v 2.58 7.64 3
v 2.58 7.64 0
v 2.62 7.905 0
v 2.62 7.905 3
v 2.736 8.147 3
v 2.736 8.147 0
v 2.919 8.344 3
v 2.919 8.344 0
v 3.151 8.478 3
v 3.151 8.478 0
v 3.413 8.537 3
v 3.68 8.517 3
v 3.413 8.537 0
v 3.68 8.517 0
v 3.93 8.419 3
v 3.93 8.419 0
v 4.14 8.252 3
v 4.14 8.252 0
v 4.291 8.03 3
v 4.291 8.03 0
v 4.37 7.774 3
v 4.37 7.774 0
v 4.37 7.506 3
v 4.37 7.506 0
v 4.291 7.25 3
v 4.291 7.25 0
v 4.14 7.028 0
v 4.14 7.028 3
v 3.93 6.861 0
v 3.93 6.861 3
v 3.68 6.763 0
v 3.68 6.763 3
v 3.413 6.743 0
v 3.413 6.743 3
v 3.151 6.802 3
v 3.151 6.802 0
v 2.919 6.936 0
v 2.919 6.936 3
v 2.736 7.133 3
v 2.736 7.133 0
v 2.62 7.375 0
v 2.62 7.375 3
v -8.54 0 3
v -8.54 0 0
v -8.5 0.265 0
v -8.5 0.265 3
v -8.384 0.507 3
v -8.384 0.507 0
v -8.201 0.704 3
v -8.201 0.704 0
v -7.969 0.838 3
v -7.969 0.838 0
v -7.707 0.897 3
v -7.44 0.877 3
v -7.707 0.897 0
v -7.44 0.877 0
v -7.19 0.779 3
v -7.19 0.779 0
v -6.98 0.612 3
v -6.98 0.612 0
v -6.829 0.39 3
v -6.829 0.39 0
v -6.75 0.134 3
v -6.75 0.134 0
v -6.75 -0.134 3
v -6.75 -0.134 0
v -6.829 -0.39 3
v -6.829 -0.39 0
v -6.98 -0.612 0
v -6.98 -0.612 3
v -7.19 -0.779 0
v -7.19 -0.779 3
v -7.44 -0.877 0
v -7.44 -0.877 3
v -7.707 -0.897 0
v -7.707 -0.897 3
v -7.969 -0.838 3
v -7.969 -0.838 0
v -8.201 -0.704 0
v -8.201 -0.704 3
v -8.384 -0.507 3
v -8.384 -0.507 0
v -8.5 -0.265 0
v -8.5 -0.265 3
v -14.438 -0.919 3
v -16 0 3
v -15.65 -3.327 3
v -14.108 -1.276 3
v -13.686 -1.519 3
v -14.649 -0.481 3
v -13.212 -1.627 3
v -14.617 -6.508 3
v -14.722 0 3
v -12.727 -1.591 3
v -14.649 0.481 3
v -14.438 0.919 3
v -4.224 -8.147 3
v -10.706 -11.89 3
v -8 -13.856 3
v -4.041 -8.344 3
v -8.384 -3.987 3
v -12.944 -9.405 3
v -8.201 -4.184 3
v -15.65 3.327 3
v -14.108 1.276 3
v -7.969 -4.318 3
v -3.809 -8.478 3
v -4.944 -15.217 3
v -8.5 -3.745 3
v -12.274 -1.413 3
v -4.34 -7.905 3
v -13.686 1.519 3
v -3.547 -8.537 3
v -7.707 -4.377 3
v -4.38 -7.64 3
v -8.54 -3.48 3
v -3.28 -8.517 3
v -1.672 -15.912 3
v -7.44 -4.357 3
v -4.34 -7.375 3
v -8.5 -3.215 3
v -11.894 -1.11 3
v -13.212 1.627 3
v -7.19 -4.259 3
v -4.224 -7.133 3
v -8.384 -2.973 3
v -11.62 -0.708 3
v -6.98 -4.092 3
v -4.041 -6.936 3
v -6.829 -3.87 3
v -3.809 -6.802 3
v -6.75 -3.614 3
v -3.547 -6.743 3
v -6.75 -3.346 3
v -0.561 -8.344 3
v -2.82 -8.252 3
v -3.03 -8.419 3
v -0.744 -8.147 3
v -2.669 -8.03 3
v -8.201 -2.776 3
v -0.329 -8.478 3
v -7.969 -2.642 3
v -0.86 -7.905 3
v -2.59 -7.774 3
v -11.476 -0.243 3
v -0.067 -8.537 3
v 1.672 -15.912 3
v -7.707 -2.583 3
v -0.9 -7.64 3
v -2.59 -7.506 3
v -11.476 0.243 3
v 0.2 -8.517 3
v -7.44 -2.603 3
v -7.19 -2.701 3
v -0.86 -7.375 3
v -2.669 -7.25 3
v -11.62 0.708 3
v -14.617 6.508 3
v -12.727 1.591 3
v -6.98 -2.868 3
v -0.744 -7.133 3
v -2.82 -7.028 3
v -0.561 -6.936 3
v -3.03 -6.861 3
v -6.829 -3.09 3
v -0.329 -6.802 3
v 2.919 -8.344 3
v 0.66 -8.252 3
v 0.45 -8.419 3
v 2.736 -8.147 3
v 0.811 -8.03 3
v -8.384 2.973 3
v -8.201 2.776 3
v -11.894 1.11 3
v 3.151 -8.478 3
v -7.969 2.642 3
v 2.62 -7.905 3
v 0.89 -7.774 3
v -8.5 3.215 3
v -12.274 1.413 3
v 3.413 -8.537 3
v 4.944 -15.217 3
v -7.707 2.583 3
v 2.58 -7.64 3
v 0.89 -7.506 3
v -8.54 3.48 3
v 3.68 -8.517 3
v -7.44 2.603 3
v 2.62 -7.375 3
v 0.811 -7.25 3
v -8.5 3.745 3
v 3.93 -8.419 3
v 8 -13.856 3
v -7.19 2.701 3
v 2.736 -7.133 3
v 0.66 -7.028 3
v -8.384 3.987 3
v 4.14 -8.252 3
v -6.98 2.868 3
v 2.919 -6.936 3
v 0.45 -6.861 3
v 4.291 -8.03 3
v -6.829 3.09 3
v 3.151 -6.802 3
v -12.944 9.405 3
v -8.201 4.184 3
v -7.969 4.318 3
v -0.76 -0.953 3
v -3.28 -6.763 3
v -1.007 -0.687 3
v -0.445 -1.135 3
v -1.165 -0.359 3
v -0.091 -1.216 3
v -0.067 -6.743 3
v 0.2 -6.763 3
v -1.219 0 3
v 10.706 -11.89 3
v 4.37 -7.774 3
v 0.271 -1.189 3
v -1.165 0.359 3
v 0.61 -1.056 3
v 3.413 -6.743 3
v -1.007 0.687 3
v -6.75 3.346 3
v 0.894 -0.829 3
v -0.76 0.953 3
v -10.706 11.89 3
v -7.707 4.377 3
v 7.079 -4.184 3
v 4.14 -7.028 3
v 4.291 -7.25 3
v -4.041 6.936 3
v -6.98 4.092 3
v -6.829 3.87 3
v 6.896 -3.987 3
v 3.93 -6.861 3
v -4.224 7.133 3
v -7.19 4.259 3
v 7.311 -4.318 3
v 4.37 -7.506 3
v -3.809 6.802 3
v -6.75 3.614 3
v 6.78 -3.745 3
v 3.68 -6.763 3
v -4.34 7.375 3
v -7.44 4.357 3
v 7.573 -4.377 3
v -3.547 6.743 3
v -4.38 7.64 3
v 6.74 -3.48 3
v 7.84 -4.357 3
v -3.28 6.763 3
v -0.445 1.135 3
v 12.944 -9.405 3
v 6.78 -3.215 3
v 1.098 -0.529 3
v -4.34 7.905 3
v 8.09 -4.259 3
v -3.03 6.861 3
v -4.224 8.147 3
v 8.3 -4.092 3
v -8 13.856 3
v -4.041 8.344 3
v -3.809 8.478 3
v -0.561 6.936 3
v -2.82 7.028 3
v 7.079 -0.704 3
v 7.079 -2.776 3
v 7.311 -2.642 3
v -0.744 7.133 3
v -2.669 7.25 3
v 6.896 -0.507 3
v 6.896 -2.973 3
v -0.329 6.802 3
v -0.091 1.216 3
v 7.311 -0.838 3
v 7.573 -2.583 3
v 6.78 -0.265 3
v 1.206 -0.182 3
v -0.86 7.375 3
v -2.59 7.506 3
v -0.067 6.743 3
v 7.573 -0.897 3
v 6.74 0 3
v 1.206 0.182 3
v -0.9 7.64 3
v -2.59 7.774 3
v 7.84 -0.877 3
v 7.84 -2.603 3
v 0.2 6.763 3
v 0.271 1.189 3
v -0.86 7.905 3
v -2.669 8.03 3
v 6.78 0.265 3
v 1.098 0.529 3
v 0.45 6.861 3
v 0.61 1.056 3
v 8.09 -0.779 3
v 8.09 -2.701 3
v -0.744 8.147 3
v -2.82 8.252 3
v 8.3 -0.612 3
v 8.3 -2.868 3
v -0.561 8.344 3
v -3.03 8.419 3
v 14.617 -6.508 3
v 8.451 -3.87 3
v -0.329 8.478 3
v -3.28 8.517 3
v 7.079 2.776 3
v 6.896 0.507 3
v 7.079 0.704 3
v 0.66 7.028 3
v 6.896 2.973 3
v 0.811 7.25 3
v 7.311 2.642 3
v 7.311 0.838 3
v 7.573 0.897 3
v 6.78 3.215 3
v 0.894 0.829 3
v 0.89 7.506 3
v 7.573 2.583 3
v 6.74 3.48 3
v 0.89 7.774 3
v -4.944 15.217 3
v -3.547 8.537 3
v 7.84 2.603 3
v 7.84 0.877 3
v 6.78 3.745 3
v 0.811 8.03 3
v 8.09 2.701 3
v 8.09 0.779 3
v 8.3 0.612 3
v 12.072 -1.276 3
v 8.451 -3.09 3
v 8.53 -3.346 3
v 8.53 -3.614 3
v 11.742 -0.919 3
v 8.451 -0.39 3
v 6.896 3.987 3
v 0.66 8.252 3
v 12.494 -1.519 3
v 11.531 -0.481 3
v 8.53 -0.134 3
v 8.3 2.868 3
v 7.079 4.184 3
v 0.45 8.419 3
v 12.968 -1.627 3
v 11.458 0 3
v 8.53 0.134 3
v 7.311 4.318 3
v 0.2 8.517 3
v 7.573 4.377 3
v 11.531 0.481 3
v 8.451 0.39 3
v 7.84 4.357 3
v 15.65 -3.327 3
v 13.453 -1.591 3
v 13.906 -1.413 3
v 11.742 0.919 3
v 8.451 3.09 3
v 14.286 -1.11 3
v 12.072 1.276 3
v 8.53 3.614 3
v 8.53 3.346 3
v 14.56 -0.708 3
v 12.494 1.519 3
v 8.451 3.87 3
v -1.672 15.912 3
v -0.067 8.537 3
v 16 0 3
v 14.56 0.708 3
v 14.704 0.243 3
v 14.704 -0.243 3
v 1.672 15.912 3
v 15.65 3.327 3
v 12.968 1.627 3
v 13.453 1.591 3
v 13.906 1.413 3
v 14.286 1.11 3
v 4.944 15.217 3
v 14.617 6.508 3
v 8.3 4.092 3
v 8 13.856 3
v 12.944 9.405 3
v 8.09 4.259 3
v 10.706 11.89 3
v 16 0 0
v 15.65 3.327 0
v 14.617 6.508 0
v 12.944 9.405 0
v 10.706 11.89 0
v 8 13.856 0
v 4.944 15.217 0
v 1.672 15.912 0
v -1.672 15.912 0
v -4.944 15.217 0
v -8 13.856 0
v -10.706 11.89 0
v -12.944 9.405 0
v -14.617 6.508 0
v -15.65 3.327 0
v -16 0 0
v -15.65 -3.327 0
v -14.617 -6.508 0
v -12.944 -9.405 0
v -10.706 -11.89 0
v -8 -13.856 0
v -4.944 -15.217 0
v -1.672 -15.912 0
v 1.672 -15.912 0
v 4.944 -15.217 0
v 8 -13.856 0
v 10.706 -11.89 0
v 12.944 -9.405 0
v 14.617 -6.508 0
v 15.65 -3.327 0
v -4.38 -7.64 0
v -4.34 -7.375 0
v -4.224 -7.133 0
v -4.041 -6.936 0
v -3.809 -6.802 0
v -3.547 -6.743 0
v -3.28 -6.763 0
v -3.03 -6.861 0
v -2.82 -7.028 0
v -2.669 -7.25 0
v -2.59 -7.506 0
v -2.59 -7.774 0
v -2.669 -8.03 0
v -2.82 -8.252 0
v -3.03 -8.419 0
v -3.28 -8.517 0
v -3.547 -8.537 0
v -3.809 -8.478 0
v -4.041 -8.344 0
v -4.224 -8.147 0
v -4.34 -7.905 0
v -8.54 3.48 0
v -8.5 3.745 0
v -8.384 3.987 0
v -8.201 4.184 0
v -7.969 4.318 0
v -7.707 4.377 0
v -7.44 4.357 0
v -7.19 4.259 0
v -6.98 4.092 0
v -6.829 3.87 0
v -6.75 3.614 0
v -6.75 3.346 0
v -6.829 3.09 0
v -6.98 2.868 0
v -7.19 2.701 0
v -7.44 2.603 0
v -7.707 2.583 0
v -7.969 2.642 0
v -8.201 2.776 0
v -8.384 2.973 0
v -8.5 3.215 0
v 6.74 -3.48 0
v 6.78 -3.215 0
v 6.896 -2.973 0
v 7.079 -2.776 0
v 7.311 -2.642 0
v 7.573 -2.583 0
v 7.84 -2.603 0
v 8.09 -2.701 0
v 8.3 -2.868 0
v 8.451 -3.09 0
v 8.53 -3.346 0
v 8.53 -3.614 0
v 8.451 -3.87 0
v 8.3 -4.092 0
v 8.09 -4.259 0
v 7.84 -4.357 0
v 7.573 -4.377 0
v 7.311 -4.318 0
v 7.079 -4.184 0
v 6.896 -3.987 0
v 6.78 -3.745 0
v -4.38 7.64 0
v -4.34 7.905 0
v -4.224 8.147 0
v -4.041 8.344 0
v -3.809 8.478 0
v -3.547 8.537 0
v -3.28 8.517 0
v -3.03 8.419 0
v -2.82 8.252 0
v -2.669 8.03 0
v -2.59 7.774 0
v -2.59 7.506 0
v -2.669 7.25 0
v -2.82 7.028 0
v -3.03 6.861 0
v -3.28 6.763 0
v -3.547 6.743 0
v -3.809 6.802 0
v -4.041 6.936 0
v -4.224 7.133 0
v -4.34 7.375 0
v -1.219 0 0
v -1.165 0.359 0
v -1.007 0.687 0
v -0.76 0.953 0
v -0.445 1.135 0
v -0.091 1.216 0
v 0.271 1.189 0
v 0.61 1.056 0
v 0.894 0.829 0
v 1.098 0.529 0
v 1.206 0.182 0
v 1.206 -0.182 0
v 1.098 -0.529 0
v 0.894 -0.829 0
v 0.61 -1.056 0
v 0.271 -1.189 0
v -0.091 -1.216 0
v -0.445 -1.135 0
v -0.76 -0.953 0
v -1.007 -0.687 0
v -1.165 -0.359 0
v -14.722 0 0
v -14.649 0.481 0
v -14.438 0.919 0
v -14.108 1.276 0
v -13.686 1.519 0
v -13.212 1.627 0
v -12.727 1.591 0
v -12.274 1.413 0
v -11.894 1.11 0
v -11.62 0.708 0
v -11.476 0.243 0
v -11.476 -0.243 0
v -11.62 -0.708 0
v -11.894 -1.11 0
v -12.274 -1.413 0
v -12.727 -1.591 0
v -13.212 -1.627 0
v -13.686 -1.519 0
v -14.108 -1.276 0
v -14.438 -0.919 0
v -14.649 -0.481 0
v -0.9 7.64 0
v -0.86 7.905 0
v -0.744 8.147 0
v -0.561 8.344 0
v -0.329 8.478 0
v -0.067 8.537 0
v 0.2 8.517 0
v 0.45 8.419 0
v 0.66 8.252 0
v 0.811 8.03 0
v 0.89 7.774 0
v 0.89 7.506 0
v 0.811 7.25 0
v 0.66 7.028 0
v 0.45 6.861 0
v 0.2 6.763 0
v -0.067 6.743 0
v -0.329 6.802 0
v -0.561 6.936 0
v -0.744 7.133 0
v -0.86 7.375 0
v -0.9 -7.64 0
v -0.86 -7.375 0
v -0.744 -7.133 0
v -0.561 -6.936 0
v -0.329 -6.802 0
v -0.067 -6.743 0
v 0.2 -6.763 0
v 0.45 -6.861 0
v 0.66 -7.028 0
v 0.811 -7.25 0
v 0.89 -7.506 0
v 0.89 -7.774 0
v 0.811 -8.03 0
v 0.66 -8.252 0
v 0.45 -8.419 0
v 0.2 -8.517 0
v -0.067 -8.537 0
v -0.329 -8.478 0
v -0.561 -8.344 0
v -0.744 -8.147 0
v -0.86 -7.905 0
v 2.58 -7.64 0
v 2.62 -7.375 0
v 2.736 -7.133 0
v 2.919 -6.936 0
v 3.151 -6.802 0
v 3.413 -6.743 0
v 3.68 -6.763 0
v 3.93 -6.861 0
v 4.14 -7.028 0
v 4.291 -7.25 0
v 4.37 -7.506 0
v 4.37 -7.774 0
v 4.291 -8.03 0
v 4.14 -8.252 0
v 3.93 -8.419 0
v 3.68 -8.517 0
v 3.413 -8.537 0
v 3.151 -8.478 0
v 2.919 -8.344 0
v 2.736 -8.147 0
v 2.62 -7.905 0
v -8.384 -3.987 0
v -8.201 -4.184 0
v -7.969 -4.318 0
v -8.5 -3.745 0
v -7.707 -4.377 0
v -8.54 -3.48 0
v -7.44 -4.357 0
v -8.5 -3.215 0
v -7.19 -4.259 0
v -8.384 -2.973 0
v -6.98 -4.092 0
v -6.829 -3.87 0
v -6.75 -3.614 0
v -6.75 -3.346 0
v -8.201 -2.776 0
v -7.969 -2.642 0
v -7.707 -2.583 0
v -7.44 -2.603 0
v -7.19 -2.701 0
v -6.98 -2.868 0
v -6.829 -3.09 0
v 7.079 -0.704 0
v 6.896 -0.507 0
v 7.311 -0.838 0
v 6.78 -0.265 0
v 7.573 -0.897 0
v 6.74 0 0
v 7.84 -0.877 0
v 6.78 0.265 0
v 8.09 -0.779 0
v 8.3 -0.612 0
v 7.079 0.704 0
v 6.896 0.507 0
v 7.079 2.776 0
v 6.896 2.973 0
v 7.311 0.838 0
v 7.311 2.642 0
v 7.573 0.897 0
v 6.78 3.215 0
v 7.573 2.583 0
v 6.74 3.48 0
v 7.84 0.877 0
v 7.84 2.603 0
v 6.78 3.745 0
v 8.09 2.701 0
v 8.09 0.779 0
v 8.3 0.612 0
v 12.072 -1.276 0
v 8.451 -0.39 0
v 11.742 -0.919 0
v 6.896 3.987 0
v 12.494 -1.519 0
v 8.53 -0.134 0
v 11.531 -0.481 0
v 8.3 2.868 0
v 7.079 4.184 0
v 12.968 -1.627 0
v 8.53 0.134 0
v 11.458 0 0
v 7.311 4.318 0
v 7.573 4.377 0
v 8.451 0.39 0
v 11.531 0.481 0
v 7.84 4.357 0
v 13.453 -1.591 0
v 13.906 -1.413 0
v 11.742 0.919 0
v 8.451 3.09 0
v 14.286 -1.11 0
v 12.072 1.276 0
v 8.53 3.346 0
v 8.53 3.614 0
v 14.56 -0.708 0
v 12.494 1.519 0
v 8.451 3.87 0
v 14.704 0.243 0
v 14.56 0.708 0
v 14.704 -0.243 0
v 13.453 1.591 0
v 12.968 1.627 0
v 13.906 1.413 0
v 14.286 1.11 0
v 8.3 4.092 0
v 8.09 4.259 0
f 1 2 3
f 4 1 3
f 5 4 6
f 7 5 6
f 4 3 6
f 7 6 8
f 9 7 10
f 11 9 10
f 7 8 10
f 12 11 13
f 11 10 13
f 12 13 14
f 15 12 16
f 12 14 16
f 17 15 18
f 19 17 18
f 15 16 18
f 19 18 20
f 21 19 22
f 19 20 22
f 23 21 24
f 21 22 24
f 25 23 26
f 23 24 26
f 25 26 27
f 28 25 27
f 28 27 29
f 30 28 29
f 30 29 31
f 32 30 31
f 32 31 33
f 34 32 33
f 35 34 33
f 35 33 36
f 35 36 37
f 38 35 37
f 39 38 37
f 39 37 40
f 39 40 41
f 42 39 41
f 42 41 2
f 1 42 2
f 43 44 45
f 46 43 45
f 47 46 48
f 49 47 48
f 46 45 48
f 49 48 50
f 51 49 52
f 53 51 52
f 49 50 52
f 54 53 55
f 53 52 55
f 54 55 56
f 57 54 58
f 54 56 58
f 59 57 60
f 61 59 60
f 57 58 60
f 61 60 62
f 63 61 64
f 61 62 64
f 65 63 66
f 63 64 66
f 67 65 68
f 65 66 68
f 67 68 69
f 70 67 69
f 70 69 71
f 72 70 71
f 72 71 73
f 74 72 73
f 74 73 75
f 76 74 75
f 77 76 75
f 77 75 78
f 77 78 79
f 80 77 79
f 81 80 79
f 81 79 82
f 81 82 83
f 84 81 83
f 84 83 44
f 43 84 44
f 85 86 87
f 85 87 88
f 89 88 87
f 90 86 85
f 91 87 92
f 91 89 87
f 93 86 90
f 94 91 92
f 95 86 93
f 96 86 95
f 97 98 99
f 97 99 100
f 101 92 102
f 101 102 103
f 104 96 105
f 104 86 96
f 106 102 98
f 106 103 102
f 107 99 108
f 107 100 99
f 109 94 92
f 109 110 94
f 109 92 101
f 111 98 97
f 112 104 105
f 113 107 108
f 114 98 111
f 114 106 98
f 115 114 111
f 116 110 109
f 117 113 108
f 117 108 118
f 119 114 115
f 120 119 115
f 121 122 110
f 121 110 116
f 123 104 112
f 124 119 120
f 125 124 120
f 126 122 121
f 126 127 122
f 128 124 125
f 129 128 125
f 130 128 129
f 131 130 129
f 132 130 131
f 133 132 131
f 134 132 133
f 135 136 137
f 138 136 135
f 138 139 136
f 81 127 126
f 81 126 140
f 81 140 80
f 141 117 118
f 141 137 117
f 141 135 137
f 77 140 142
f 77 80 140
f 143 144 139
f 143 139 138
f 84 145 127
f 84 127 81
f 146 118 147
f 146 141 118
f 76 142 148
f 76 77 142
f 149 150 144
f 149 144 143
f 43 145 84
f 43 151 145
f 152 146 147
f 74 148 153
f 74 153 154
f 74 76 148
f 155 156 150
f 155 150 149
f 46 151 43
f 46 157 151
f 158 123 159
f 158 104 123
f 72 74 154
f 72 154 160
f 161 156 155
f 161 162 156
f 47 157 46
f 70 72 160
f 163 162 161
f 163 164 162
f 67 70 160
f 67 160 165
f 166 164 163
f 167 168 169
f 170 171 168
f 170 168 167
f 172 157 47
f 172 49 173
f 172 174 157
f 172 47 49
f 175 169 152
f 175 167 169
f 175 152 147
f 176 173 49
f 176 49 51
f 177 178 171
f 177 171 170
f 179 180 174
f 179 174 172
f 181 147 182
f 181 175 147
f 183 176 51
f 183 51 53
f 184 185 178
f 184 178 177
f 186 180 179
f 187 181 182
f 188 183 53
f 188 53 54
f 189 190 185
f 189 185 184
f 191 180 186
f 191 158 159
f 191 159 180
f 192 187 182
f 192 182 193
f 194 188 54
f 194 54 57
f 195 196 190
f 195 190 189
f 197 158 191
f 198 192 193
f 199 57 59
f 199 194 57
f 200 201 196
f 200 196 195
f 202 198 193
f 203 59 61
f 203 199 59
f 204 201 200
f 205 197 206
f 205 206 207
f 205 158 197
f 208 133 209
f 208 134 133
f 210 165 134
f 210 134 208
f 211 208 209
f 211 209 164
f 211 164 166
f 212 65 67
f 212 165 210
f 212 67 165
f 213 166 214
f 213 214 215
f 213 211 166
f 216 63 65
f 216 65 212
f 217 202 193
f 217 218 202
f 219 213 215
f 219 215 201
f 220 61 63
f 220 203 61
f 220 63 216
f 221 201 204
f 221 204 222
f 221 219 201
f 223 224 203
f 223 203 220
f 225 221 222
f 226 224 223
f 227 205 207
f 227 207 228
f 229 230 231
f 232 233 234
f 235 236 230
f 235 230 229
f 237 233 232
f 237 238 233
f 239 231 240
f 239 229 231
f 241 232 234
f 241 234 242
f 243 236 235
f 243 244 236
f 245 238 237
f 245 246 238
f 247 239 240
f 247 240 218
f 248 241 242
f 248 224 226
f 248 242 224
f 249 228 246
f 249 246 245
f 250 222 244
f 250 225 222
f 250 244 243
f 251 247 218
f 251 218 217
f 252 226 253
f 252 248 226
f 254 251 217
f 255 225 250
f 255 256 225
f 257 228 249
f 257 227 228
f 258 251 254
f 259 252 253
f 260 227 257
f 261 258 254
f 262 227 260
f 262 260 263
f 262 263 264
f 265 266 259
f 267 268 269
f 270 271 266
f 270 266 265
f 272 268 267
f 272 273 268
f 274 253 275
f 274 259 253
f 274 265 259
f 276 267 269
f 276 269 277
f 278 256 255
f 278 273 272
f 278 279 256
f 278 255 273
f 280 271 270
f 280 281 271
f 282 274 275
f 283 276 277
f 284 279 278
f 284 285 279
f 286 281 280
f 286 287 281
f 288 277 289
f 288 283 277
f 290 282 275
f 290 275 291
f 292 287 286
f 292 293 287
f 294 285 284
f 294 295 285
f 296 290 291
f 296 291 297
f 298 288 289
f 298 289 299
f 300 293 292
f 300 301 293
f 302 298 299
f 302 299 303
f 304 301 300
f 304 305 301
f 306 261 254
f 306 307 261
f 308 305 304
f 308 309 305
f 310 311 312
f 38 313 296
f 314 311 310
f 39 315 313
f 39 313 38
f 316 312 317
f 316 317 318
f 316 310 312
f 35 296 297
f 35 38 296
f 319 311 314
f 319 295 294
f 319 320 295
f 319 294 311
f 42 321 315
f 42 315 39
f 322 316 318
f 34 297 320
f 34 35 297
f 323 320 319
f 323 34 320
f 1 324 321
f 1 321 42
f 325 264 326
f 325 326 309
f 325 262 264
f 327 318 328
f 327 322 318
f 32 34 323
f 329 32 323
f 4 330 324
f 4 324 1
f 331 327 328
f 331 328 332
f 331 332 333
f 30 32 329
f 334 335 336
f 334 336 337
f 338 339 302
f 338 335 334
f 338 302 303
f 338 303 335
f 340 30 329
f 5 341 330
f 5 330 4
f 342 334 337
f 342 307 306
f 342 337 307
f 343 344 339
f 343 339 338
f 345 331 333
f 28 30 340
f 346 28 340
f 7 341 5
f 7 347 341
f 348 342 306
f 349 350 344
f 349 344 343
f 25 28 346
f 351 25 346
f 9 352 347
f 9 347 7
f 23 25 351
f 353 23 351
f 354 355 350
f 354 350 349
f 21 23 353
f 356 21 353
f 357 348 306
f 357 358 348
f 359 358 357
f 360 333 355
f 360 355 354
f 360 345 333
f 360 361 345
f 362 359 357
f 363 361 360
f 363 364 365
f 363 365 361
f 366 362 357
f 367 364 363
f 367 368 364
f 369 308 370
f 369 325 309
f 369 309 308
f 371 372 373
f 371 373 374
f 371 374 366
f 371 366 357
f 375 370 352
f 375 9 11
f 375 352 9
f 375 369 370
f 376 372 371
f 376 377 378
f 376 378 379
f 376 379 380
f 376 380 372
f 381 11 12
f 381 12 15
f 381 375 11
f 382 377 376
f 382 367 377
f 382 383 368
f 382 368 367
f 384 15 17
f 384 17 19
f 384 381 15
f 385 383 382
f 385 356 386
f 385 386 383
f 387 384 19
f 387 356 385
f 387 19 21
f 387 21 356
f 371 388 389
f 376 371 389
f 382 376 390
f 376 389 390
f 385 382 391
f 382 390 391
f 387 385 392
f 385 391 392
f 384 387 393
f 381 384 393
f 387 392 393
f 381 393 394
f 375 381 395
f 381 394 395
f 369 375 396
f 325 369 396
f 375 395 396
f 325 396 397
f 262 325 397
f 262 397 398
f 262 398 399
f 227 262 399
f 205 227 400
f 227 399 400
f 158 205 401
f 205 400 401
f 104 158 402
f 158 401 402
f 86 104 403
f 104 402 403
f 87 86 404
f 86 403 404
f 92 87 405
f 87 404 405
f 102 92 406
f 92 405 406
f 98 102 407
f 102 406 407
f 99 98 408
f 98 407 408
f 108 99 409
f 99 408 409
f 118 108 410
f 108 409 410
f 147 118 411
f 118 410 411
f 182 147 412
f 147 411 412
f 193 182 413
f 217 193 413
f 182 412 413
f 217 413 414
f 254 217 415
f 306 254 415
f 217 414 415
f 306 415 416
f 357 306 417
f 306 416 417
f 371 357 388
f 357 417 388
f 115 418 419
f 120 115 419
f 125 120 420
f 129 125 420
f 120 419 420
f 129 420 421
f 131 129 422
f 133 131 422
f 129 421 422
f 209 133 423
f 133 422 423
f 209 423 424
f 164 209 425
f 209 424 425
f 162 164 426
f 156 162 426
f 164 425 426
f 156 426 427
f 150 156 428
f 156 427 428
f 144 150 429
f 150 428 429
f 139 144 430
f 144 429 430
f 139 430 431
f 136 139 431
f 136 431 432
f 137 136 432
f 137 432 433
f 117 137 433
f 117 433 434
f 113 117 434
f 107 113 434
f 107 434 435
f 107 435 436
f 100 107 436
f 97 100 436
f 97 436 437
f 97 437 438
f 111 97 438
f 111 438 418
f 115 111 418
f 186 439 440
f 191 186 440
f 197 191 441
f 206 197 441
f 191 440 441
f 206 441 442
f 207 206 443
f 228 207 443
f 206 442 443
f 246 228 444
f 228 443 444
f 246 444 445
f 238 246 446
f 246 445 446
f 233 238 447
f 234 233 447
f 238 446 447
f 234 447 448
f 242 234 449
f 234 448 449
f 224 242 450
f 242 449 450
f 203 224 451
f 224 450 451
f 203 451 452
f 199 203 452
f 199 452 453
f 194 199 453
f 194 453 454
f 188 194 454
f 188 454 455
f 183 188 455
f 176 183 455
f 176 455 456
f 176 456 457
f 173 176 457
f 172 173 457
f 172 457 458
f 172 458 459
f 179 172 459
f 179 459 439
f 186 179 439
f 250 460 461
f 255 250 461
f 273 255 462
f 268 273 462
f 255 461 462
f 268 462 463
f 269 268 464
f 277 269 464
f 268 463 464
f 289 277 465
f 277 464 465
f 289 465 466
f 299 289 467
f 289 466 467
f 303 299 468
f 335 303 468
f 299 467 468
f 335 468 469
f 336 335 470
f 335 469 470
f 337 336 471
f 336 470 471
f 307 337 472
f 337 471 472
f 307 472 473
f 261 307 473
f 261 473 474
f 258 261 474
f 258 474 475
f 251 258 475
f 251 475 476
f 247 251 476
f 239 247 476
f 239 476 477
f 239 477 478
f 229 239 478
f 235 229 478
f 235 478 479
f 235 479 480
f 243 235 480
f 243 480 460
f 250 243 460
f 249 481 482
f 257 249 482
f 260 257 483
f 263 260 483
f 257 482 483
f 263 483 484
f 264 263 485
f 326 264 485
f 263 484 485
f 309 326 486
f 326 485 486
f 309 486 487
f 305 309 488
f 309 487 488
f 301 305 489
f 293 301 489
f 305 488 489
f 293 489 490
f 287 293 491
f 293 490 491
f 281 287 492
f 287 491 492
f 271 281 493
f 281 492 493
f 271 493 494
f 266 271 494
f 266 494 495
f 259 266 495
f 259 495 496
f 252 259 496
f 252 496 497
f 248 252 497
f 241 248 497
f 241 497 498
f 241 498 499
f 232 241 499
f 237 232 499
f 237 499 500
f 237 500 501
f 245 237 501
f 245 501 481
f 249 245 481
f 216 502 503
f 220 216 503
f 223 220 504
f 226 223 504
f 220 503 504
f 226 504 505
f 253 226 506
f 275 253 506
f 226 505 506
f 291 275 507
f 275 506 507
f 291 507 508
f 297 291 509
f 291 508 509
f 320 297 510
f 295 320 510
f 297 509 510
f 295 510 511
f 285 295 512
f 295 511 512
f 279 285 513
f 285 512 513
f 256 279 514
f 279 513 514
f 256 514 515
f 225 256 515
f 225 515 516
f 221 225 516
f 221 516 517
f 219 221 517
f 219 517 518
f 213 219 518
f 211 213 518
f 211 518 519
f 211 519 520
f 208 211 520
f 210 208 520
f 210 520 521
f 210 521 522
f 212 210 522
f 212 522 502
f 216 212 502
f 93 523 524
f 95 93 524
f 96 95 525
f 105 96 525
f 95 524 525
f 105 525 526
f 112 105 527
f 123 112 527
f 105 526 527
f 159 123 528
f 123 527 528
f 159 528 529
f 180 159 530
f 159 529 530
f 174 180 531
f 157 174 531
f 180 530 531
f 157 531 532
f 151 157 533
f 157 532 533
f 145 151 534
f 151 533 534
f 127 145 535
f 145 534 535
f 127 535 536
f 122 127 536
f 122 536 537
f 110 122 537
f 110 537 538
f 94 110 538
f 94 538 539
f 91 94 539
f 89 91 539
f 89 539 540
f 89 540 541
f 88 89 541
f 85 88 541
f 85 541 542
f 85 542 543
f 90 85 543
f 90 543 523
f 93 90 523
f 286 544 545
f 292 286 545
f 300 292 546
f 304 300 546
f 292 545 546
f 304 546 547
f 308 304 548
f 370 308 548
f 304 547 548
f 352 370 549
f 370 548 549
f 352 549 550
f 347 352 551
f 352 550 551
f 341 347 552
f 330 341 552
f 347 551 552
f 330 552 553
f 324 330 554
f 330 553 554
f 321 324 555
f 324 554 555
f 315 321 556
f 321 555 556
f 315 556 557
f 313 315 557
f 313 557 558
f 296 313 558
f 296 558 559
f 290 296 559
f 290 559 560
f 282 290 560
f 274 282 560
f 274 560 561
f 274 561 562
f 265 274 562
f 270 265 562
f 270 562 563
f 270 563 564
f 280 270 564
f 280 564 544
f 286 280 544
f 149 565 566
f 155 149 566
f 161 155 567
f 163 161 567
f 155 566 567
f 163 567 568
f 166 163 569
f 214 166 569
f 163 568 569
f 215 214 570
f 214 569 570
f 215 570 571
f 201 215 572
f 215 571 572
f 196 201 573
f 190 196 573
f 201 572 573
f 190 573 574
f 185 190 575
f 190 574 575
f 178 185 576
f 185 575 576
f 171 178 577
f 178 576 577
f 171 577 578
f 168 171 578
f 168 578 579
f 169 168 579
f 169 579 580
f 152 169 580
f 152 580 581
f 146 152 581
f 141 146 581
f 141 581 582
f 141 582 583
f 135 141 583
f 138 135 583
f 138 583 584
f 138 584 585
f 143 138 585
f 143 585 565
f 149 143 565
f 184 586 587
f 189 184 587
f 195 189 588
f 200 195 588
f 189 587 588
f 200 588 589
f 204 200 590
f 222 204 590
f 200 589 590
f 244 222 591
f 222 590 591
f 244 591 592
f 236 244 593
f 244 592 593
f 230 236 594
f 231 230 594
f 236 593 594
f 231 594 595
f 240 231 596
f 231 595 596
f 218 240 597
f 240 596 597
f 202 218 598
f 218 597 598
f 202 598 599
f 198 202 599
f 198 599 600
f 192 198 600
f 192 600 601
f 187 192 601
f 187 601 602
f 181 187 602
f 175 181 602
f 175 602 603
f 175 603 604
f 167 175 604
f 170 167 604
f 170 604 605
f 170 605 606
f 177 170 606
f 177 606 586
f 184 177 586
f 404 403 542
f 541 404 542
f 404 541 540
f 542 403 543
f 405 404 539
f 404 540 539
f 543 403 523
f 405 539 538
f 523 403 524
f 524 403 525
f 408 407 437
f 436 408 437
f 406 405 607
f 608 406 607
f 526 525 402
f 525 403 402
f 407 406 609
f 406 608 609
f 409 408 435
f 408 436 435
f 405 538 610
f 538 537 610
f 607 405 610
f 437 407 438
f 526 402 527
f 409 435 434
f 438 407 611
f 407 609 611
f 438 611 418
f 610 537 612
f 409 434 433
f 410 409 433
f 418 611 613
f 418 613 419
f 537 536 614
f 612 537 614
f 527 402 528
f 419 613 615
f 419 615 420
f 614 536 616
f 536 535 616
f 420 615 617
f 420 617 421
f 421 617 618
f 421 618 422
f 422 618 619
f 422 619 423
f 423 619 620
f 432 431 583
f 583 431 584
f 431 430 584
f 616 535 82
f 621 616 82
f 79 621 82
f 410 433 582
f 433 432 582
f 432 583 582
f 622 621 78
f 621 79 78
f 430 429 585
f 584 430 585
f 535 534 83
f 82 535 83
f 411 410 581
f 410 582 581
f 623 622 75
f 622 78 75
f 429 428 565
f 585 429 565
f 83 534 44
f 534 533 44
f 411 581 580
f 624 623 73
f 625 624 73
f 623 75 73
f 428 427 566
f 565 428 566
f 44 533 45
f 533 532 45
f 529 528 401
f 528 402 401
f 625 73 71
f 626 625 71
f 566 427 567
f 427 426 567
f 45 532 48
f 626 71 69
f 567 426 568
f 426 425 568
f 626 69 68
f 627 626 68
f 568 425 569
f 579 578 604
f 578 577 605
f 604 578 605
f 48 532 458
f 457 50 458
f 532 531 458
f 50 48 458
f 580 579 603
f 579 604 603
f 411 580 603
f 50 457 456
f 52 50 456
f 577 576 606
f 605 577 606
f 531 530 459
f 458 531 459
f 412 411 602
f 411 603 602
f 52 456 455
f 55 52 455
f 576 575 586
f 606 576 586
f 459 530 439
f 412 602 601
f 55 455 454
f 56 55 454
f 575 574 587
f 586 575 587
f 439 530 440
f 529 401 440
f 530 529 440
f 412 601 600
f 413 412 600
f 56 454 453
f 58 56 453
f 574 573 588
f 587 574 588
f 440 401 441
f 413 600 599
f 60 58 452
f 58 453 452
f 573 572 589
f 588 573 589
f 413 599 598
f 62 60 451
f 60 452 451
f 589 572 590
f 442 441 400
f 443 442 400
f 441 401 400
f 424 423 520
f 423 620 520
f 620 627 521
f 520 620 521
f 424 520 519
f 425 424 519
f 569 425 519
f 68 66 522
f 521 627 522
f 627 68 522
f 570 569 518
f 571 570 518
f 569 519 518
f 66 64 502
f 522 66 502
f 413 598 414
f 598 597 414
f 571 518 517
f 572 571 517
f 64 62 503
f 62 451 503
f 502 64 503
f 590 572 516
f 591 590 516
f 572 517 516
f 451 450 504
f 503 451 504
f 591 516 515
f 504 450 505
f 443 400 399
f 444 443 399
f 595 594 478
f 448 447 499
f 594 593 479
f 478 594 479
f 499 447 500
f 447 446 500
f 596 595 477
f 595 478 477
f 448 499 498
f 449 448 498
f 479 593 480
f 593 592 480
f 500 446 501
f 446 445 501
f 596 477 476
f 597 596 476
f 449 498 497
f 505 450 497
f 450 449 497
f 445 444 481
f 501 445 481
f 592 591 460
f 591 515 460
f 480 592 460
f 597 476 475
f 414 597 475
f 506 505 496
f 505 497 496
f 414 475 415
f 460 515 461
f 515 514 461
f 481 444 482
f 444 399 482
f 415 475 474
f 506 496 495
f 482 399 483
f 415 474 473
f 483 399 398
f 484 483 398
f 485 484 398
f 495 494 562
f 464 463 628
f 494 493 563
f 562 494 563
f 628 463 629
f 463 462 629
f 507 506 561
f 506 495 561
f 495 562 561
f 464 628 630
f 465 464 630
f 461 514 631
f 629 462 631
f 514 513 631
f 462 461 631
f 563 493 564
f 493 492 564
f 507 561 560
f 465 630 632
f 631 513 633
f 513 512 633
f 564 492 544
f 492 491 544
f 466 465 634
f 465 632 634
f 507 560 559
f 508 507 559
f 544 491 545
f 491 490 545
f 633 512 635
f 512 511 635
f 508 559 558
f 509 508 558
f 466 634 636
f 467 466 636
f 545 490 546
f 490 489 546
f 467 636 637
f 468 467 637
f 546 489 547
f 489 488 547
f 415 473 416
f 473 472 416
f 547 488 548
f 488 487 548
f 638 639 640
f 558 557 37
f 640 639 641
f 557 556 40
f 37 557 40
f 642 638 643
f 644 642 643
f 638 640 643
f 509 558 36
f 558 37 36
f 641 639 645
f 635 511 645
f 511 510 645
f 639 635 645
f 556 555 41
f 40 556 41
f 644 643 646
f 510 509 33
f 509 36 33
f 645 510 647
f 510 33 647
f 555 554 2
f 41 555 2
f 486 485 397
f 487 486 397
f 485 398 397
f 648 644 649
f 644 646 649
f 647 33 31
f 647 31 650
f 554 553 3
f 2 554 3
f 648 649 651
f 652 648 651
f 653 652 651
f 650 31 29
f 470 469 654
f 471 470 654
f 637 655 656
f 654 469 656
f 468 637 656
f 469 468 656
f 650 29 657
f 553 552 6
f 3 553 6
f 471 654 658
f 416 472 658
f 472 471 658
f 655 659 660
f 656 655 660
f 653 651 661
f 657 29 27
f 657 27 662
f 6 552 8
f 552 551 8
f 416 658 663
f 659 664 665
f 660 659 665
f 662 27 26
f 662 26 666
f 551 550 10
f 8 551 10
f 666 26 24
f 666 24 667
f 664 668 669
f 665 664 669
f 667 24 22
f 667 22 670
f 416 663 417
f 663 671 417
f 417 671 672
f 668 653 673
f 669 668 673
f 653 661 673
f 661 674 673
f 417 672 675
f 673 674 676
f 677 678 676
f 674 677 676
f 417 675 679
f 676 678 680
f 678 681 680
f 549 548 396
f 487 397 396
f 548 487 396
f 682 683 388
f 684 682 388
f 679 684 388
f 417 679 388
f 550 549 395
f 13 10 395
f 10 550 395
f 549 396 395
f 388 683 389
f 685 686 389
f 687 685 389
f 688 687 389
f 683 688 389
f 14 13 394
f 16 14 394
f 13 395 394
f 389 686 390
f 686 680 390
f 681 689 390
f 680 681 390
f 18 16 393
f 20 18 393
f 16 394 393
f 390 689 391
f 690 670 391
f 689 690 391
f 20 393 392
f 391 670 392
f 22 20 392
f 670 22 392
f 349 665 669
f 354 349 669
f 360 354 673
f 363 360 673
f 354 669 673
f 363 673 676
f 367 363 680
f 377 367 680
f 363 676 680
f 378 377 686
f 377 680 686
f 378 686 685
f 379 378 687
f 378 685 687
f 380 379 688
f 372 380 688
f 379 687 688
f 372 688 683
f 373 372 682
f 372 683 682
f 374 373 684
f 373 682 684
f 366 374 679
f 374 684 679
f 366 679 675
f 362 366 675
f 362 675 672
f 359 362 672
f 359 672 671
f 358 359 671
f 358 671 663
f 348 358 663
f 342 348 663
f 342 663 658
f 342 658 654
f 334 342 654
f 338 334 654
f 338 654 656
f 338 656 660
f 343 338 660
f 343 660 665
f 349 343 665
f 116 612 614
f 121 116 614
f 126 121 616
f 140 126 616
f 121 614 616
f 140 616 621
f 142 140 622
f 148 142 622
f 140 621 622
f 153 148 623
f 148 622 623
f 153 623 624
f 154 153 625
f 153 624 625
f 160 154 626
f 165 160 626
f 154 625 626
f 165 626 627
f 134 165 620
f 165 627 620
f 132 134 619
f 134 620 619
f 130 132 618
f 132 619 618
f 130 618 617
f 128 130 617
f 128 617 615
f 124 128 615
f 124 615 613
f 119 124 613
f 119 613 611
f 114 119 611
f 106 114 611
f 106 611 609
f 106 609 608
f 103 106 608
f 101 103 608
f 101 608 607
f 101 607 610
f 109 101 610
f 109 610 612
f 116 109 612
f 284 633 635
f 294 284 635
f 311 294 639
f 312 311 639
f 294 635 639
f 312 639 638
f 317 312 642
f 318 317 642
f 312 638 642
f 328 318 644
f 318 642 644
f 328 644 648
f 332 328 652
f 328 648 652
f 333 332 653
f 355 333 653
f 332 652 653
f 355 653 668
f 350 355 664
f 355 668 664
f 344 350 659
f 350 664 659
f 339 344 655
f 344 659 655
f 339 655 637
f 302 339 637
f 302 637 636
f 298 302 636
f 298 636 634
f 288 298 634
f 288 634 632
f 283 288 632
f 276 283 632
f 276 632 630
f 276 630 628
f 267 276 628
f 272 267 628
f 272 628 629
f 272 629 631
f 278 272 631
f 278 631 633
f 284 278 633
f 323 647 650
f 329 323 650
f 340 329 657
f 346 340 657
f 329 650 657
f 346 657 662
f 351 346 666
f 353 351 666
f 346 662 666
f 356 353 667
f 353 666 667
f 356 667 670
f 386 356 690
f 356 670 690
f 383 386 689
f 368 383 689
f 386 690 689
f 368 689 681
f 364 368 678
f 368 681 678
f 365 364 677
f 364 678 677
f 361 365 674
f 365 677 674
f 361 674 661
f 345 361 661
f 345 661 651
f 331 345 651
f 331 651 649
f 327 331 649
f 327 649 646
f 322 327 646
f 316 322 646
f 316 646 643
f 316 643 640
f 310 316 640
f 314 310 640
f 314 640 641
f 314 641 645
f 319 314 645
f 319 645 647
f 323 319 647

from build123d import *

# Parameters (mm, degrees)
SKETCH1_R              = 16
BOSS_EXTRUDE1_DEPTH    = 3
M1_6_CLEARANCE_HOLE1_D = 1.8
F_4_CLEARANCE_HOLE1_D  = 3.2639
F_2_CLEARANCE_HOLE1_D  = 2.4384


with BuildPart() as part:
    # Sketch1 → Boss-Extrude1 (new body)
    with BuildSketch(Plane.XY):
        Circle(SKETCH1_R)
    extrude(amount=BOSS_EXTRUDE1_DEPTH)

    # M1.6 Clearance Hole1 (through all)
    with Locations(Plane.XY.offset(3)):
        with Locations((-3.48, 7.64), (0, 7.64), (3.48, 7.64), (7.64, 3.48), (7.64, -3.48), (7.64, 0), (3.48, -7.64), (0, -7.64), (-3.48, -7.64), (-7.64, 0), (-7.64, -3.48), (-7.64, 3.48)):
            Hole(M1_6_CLEARANCE_HOLE1_D / 2)

    # #4 Clearance Hole1 (through all)
    with Locations(Plane.XY.offset(3)):
        with Locations((-13.09, 0), (13.09, 0)):
            Hole(F_4_CLEARANCE_HOLE1_D / 2)

    # #2 Clearance Hole1 (through all)
    with Locations(Plane.XY.offset(3)):
        with Locations((0, 0)):
            Hole(F_2_CLEARANCE_HOLE1_D / 2)


solid = part.part
